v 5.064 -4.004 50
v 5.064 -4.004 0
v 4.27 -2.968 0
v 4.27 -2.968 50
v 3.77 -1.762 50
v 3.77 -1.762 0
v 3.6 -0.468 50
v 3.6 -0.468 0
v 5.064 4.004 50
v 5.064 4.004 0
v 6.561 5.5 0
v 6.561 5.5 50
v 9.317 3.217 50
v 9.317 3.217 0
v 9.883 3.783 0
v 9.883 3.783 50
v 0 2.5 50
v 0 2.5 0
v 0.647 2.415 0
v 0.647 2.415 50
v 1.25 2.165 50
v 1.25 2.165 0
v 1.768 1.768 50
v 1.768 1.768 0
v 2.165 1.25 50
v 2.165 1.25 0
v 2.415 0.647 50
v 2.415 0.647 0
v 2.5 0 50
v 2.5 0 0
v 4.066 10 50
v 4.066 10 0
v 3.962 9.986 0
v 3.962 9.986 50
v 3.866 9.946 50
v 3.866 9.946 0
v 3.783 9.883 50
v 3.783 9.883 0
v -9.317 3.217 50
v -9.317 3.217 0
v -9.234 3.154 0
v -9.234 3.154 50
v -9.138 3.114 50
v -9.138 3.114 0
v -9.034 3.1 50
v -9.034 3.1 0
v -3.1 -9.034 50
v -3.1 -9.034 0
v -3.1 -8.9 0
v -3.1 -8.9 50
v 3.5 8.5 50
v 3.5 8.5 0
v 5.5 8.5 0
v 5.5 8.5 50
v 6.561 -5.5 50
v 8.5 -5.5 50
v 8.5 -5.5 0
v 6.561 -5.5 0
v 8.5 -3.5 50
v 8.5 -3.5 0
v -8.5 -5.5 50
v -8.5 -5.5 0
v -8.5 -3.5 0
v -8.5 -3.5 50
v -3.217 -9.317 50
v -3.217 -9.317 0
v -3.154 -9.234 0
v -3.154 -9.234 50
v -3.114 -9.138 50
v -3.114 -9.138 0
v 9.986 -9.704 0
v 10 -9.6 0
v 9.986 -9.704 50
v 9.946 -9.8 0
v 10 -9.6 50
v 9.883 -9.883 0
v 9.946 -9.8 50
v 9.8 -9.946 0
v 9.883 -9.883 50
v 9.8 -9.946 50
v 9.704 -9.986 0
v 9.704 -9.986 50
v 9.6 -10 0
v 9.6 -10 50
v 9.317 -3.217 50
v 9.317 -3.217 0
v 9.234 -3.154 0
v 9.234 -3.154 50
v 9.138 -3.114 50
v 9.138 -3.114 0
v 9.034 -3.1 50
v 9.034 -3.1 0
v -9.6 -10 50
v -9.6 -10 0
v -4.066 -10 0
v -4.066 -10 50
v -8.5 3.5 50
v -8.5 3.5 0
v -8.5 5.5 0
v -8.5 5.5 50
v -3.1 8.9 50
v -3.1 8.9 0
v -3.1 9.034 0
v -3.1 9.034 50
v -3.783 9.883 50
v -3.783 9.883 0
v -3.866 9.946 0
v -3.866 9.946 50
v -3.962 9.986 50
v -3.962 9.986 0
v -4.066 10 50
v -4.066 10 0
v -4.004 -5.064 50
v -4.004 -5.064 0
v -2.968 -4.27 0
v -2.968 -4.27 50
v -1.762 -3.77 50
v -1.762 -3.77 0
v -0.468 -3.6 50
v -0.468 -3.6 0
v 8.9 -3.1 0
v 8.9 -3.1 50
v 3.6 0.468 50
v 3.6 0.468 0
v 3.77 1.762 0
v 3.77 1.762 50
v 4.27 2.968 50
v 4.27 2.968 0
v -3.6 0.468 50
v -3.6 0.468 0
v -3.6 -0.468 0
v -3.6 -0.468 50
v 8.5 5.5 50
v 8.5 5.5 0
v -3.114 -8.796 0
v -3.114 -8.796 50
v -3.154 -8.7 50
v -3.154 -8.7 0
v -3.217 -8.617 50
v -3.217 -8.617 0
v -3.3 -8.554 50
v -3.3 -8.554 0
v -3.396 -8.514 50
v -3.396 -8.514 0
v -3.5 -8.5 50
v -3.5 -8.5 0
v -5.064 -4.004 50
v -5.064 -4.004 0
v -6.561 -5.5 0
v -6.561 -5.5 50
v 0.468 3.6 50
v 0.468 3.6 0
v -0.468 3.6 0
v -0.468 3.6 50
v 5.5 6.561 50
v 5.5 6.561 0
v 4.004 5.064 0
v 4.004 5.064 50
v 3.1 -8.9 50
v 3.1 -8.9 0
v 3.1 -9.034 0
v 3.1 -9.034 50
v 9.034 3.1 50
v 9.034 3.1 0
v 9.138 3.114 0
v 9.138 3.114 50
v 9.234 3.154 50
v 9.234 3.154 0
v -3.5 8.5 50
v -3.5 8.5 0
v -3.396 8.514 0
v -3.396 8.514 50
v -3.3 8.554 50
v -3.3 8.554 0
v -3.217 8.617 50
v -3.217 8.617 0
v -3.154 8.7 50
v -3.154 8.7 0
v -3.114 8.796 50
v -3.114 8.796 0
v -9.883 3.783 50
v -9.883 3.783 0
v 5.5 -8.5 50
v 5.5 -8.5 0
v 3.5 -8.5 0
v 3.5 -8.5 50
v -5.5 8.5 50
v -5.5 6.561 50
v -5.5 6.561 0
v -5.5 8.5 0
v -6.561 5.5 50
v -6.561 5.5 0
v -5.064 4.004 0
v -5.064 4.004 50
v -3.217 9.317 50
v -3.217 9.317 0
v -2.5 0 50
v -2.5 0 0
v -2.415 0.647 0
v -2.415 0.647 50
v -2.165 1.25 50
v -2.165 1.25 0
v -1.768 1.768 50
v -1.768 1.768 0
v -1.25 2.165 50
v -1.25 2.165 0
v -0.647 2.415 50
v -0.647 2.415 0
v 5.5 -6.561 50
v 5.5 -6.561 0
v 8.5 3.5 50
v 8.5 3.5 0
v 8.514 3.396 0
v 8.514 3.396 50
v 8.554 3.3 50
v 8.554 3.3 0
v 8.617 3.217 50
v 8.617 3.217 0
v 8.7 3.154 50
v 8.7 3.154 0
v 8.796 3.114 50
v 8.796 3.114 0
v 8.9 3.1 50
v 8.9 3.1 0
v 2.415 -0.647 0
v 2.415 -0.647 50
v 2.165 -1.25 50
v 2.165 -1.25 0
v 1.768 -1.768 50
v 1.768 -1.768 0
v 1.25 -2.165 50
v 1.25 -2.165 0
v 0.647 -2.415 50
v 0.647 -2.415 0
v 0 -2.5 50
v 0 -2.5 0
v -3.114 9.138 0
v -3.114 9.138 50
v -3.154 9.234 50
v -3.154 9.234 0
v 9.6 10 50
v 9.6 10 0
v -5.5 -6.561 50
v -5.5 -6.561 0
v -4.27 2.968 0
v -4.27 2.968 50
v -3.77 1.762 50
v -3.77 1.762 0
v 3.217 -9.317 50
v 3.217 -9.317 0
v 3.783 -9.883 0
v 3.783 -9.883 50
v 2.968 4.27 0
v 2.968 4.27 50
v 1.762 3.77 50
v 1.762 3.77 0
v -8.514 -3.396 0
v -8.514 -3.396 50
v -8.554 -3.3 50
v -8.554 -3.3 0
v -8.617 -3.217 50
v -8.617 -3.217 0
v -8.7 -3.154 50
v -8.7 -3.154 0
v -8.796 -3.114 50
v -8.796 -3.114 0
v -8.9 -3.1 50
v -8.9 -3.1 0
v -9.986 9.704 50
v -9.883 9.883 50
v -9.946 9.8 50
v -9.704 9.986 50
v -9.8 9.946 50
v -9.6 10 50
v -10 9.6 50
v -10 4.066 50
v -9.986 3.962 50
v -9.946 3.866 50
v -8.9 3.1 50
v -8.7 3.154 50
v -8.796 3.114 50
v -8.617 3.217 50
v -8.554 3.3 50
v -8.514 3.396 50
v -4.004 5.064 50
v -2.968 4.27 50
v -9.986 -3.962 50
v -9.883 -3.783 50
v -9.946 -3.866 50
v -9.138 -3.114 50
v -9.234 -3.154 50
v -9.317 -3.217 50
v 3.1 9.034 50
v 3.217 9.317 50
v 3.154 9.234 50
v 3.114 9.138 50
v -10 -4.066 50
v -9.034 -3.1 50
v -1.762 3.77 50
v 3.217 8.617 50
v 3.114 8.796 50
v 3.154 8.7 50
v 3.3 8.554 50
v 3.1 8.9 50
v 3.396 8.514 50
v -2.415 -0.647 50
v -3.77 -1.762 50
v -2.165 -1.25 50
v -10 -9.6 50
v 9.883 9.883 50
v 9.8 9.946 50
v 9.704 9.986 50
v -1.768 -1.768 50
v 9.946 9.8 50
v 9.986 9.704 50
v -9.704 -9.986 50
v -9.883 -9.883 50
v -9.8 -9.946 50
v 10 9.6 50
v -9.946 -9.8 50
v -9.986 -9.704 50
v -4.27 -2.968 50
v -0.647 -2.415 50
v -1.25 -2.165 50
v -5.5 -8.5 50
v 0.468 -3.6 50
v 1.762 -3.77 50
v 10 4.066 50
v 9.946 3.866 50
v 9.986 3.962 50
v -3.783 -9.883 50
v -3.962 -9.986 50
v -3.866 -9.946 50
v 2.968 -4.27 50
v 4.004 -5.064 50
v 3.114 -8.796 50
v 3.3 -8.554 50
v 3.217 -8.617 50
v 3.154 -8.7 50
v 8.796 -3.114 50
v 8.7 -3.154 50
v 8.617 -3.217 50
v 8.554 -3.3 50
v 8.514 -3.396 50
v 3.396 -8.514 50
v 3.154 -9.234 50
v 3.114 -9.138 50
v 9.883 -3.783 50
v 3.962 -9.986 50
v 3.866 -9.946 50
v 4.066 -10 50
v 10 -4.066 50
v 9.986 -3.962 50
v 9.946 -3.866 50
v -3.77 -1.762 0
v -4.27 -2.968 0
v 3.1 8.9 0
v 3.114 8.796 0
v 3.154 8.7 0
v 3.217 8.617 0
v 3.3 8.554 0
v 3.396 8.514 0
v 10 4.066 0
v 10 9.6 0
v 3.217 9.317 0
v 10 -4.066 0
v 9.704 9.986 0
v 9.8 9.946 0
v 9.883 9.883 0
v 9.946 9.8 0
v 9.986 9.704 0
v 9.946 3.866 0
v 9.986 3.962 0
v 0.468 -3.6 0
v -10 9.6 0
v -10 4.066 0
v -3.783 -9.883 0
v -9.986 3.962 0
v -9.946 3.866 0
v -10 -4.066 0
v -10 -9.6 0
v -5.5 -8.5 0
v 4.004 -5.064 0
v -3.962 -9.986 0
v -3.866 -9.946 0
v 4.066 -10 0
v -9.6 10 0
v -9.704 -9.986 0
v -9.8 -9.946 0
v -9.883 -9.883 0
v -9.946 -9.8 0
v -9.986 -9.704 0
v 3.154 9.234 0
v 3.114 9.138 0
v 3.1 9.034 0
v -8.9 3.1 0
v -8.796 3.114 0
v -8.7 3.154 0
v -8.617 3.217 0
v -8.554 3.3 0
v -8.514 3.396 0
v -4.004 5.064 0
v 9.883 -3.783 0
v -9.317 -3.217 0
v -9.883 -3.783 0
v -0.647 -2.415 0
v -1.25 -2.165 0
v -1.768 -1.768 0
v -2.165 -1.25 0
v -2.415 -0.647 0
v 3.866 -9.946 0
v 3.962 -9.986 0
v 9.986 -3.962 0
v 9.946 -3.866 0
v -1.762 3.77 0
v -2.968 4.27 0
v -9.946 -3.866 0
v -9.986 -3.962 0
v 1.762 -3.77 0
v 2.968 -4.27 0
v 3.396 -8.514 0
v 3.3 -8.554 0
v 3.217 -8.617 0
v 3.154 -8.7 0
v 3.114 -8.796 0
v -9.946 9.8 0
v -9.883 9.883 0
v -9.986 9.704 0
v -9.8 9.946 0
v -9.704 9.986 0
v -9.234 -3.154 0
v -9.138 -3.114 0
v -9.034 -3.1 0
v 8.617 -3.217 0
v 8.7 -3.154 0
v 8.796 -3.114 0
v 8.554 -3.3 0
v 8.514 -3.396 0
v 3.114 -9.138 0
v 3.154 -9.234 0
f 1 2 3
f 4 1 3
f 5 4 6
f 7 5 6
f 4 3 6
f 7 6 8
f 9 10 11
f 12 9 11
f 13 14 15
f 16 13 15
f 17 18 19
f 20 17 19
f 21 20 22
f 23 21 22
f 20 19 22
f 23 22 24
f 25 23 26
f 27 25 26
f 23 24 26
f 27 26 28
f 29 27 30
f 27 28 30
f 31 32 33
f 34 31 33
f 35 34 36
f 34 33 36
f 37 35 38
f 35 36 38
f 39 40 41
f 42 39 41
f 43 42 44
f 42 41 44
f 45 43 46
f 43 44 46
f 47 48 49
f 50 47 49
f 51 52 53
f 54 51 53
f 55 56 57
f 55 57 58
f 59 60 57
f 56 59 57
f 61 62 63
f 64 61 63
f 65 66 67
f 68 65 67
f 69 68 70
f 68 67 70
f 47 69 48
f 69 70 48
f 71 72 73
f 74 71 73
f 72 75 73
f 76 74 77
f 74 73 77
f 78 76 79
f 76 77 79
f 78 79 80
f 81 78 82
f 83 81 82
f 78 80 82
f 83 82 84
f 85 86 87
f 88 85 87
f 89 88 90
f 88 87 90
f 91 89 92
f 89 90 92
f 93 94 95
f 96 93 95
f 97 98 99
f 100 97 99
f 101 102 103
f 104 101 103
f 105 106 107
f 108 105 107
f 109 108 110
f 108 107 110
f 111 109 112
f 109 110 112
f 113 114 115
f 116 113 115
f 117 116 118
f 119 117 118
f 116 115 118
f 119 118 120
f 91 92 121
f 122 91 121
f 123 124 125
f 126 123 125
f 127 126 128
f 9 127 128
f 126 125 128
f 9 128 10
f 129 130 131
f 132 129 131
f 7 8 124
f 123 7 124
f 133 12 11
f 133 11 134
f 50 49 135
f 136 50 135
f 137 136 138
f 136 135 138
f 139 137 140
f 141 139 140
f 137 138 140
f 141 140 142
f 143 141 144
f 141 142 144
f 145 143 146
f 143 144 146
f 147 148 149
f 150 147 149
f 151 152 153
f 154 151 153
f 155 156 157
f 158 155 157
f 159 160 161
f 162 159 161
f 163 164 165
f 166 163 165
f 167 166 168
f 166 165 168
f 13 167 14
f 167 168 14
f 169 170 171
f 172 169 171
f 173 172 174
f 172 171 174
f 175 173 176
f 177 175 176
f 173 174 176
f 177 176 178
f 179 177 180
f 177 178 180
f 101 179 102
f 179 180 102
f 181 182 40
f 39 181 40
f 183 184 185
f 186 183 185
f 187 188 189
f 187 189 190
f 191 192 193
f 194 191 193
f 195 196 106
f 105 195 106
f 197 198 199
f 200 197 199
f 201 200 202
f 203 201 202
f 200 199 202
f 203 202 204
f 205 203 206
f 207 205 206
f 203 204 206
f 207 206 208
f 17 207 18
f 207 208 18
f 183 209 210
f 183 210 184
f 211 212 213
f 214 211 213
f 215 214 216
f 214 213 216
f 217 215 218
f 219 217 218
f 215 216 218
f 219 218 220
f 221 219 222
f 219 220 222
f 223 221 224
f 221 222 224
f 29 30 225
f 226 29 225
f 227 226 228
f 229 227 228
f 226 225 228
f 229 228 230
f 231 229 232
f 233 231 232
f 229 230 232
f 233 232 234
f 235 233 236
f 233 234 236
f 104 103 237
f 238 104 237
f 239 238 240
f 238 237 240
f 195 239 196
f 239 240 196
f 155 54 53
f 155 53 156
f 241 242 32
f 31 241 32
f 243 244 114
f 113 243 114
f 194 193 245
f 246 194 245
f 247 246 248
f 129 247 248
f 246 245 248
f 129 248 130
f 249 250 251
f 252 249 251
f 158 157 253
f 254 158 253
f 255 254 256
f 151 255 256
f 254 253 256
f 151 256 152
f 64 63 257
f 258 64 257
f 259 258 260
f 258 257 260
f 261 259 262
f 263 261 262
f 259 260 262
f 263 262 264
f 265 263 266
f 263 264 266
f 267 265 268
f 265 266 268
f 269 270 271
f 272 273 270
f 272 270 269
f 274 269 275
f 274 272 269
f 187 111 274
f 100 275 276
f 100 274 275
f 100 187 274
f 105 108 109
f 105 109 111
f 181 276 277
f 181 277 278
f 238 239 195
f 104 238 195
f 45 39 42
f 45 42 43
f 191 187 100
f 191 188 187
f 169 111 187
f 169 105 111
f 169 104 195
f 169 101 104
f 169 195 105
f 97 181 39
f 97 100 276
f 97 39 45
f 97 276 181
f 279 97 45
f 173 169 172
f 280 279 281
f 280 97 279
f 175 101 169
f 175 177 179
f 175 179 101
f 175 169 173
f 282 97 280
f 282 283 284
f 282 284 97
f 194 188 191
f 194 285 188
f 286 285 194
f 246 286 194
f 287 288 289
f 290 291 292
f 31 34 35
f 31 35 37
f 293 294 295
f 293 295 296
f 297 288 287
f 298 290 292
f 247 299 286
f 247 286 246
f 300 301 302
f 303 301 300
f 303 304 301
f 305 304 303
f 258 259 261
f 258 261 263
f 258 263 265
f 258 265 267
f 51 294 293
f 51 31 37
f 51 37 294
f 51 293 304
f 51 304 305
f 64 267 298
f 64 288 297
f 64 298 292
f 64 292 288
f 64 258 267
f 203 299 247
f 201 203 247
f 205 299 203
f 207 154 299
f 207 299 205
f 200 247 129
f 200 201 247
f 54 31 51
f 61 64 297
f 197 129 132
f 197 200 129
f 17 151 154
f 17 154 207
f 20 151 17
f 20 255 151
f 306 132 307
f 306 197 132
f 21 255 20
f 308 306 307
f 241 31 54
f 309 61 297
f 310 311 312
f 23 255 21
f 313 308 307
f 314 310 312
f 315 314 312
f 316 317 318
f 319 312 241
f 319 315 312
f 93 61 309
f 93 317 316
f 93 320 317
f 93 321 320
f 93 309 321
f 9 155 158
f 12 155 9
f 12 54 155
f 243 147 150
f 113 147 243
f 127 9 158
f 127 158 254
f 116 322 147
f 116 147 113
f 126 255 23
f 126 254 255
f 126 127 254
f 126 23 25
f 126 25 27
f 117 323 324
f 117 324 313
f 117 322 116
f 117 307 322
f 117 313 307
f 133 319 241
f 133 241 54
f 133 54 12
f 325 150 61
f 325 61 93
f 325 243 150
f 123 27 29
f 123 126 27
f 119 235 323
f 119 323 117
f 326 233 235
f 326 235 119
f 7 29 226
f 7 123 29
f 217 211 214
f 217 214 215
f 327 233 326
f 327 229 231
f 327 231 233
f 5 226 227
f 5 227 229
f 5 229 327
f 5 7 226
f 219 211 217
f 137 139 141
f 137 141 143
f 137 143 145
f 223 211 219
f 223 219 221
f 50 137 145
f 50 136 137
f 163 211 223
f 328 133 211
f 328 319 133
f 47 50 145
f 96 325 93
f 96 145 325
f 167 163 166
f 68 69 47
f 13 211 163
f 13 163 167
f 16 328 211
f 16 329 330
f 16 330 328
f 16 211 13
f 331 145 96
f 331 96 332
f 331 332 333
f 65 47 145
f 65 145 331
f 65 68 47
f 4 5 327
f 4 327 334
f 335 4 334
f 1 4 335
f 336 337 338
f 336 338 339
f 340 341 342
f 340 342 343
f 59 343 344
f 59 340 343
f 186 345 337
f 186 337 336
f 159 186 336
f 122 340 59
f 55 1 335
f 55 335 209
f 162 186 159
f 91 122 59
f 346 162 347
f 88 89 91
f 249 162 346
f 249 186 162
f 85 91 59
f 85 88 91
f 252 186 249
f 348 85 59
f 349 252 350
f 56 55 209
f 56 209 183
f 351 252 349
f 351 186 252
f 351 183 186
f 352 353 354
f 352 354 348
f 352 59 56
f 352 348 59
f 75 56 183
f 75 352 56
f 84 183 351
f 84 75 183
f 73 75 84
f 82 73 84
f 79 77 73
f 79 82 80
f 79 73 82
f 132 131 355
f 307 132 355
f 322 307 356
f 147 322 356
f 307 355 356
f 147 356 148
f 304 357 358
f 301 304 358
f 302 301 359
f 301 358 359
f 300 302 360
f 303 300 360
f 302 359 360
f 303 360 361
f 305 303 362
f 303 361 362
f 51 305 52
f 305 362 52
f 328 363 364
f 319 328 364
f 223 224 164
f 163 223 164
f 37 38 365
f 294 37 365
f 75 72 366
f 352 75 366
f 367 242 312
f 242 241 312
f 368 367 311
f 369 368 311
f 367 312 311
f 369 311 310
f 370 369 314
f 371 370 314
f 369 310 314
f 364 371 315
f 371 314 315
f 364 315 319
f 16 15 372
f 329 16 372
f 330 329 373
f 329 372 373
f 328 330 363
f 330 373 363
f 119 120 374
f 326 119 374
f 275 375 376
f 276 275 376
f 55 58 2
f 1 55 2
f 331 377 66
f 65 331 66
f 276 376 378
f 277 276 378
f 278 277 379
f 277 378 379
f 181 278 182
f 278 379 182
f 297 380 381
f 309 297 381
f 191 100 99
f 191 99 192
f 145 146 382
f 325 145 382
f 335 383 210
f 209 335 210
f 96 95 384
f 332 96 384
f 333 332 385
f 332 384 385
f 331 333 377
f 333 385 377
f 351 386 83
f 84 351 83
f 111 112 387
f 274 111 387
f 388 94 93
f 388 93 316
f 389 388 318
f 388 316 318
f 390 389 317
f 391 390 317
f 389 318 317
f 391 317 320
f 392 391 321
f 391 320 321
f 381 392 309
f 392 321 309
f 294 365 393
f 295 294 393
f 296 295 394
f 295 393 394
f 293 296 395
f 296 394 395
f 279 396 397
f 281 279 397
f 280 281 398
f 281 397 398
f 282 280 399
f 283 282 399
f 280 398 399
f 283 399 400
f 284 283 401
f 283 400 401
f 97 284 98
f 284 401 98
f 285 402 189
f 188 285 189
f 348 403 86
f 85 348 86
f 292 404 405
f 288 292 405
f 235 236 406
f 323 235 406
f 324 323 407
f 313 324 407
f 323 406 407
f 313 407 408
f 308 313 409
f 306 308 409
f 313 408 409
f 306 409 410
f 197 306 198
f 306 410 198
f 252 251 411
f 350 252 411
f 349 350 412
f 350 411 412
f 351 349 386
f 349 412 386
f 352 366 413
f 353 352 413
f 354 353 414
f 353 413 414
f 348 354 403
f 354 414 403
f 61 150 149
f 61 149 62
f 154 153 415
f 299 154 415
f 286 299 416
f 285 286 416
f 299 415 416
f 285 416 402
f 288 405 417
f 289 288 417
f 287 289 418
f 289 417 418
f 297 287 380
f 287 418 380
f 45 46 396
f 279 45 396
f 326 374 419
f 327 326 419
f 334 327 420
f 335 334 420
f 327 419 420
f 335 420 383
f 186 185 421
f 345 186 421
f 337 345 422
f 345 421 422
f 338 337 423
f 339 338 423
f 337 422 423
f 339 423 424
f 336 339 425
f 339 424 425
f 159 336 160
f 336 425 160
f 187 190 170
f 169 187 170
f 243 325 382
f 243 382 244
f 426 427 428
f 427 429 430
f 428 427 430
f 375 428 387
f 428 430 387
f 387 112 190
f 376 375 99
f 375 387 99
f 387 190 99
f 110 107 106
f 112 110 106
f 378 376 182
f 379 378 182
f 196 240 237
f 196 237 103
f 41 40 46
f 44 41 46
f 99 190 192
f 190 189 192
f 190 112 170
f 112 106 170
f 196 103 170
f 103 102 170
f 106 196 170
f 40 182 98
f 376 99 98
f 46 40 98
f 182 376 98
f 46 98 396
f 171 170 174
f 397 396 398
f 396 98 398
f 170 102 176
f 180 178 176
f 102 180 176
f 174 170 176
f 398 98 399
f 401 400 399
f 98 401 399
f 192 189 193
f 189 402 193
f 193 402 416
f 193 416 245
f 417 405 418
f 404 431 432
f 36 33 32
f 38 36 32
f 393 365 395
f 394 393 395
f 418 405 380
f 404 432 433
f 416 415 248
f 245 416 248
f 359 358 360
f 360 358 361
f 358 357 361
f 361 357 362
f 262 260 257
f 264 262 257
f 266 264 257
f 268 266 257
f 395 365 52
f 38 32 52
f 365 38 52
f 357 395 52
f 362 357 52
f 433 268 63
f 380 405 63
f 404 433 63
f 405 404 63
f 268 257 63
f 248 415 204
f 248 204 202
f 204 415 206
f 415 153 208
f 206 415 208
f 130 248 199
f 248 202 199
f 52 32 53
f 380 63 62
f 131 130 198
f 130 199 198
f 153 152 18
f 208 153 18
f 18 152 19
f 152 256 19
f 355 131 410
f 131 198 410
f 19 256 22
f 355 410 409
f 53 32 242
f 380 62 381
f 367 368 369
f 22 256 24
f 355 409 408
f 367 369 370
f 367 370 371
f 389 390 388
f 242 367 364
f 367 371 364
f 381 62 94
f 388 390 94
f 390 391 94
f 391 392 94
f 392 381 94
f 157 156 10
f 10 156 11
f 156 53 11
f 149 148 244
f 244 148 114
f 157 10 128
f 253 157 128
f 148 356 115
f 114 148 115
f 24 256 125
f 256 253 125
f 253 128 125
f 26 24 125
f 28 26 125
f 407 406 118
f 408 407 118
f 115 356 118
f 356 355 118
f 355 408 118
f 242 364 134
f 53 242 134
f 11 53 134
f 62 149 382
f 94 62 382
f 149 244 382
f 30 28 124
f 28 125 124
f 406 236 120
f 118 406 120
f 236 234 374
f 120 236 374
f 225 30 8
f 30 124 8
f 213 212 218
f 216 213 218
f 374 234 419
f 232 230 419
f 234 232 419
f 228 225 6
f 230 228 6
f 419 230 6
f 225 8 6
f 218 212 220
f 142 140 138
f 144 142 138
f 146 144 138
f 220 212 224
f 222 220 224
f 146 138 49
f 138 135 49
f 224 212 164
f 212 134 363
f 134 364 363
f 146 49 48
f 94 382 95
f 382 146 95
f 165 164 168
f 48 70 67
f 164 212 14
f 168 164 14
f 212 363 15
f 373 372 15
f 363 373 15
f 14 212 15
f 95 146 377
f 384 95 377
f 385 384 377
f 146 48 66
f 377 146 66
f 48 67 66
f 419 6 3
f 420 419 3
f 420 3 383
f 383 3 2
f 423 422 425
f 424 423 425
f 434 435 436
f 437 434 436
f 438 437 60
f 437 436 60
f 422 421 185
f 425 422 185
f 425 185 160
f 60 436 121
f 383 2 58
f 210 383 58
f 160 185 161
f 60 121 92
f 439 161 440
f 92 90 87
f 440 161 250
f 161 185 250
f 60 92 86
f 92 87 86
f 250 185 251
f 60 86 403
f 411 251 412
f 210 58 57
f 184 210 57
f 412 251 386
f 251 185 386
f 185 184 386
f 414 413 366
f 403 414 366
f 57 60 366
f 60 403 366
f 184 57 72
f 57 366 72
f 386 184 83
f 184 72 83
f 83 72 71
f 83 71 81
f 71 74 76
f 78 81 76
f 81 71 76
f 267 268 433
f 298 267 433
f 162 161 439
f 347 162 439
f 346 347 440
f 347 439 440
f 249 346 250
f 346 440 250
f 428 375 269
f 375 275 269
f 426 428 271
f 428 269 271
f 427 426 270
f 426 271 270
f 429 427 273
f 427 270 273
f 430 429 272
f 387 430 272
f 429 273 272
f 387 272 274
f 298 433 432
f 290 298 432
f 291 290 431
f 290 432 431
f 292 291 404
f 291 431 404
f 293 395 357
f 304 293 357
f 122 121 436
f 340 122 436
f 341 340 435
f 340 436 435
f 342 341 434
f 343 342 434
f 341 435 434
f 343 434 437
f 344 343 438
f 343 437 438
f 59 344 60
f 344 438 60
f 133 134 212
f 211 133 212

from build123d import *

# Parameters (mm, degrees)
RESSALTO_EXTRUS_O1_DEPTH = 50
PADR_OCIRCULAR1_COUNT    = 4
FILETE1_R                = 0.4


with BuildPart() as part:
    # Esboço1 → Ressalto-extrusão1 (new body)
    with BuildSketch(Plane.XY):
        with BuildLine():
            ThreePointArc((-9.317157288, 3.217157288), (-9.187387948, 3.130448187), (-9.034314575, 3.1))
            Line((-9.034314575, 3.1), (-8.9, 3.1))
            ThreePointArc((-8.9, 3.1), (-8.617157288, 3.217157288), (-8.5, 3.5))
            Line((-8.5, 3.5), (-8.5, 5.5))
            Line((-8.5, 5.5), (-6.560660172, 5.5))
            Line((-6.560660172, 5.5), (-5.064466094, 4.003805922))
            ThreePointArc((-5.064466094, 4.003805922), (-3.980602337, 2.381689178), (-3.6, 0.468272016))
            Line((-3.6, 0.468272016), (-3.6, 0))
            Line((-3.6, 0), (-2.5, 0))
            ThreePointArc((-2.5, 0), (-1.767766953, 1.767766953), (0, 2.5))
            Line((0, 2.5), (0, 3.6))
            Line((0, 3.6), (-0.468272016, 3.6))
            ThreePointArc((-0.468272016, 3.6), (-2.381689178, 3.980602337), (-4.003805922, 5.064466094))
            Line((-4.003805922, 5.064466094), (-5.5, 6.560660172))
            Line((-5.5, 6.560660172), (-5.5, 8.5))
            Line((-5.5, 8.5), (-3.5, 8.5))
            ThreePointArc((-3.5, 8.5), (-3.217157288, 8.617157288), (-3.1, 8.9))
            Line((-3.1, 8.9), (-3.1, 9.034314575))
            ThreePointArc((-3.1, 9.034314575), (-3.130448187, 9.187387948), (-3.217157288, 9.317157288))
            Line((-3.217157288, 9.317157288), (-3.782842712, 9.882842712))
            ThreePointArc((-3.782842712, 9.882842712), (-3.912612052, 9.969551813), (-4.065685425, 10))
            Line((-4.065685425, 10), (-10, 10))
            Line((-10, 10), (-10, 4.065685425))
            ThreePointArc((-10, 4.065685425), (-9.969551813, 3.912612052), (-9.882842712, 3.782842712))
            Line((-9.882842712, 3.782842712), (-9.317157288, 3.217157288))
        make_face()
    ressalto_extrus_o1 = extrude(amount=RESSALTO_EXTRUS_O1_DEPTH)

    # PadrãoCircular1: Ressalto-extrusão1 ×4 about axis
    padr_ocircular1_axis = Axis((0, 0, 0), (0, 0, 1))
    for i in range(1, PADR_OCIRCULAR1_COUNT):
        add(ressalto_extrus_o1.rotate(padr_ocircular1_axis, i * 360 / PADR_OCIRCULAR1_COUNT))

    # Filete1
    filete1_edges = [part.edges().sort_by_distance(p)[0] for p in [
        (10, -10, 25),
        (10, 10, 25),
        (-10, 10, 25),
        (-10, -10, 25),
    ]]
    fillet(filete1_edges, radius=FILETE1_R)


solid = part.part
